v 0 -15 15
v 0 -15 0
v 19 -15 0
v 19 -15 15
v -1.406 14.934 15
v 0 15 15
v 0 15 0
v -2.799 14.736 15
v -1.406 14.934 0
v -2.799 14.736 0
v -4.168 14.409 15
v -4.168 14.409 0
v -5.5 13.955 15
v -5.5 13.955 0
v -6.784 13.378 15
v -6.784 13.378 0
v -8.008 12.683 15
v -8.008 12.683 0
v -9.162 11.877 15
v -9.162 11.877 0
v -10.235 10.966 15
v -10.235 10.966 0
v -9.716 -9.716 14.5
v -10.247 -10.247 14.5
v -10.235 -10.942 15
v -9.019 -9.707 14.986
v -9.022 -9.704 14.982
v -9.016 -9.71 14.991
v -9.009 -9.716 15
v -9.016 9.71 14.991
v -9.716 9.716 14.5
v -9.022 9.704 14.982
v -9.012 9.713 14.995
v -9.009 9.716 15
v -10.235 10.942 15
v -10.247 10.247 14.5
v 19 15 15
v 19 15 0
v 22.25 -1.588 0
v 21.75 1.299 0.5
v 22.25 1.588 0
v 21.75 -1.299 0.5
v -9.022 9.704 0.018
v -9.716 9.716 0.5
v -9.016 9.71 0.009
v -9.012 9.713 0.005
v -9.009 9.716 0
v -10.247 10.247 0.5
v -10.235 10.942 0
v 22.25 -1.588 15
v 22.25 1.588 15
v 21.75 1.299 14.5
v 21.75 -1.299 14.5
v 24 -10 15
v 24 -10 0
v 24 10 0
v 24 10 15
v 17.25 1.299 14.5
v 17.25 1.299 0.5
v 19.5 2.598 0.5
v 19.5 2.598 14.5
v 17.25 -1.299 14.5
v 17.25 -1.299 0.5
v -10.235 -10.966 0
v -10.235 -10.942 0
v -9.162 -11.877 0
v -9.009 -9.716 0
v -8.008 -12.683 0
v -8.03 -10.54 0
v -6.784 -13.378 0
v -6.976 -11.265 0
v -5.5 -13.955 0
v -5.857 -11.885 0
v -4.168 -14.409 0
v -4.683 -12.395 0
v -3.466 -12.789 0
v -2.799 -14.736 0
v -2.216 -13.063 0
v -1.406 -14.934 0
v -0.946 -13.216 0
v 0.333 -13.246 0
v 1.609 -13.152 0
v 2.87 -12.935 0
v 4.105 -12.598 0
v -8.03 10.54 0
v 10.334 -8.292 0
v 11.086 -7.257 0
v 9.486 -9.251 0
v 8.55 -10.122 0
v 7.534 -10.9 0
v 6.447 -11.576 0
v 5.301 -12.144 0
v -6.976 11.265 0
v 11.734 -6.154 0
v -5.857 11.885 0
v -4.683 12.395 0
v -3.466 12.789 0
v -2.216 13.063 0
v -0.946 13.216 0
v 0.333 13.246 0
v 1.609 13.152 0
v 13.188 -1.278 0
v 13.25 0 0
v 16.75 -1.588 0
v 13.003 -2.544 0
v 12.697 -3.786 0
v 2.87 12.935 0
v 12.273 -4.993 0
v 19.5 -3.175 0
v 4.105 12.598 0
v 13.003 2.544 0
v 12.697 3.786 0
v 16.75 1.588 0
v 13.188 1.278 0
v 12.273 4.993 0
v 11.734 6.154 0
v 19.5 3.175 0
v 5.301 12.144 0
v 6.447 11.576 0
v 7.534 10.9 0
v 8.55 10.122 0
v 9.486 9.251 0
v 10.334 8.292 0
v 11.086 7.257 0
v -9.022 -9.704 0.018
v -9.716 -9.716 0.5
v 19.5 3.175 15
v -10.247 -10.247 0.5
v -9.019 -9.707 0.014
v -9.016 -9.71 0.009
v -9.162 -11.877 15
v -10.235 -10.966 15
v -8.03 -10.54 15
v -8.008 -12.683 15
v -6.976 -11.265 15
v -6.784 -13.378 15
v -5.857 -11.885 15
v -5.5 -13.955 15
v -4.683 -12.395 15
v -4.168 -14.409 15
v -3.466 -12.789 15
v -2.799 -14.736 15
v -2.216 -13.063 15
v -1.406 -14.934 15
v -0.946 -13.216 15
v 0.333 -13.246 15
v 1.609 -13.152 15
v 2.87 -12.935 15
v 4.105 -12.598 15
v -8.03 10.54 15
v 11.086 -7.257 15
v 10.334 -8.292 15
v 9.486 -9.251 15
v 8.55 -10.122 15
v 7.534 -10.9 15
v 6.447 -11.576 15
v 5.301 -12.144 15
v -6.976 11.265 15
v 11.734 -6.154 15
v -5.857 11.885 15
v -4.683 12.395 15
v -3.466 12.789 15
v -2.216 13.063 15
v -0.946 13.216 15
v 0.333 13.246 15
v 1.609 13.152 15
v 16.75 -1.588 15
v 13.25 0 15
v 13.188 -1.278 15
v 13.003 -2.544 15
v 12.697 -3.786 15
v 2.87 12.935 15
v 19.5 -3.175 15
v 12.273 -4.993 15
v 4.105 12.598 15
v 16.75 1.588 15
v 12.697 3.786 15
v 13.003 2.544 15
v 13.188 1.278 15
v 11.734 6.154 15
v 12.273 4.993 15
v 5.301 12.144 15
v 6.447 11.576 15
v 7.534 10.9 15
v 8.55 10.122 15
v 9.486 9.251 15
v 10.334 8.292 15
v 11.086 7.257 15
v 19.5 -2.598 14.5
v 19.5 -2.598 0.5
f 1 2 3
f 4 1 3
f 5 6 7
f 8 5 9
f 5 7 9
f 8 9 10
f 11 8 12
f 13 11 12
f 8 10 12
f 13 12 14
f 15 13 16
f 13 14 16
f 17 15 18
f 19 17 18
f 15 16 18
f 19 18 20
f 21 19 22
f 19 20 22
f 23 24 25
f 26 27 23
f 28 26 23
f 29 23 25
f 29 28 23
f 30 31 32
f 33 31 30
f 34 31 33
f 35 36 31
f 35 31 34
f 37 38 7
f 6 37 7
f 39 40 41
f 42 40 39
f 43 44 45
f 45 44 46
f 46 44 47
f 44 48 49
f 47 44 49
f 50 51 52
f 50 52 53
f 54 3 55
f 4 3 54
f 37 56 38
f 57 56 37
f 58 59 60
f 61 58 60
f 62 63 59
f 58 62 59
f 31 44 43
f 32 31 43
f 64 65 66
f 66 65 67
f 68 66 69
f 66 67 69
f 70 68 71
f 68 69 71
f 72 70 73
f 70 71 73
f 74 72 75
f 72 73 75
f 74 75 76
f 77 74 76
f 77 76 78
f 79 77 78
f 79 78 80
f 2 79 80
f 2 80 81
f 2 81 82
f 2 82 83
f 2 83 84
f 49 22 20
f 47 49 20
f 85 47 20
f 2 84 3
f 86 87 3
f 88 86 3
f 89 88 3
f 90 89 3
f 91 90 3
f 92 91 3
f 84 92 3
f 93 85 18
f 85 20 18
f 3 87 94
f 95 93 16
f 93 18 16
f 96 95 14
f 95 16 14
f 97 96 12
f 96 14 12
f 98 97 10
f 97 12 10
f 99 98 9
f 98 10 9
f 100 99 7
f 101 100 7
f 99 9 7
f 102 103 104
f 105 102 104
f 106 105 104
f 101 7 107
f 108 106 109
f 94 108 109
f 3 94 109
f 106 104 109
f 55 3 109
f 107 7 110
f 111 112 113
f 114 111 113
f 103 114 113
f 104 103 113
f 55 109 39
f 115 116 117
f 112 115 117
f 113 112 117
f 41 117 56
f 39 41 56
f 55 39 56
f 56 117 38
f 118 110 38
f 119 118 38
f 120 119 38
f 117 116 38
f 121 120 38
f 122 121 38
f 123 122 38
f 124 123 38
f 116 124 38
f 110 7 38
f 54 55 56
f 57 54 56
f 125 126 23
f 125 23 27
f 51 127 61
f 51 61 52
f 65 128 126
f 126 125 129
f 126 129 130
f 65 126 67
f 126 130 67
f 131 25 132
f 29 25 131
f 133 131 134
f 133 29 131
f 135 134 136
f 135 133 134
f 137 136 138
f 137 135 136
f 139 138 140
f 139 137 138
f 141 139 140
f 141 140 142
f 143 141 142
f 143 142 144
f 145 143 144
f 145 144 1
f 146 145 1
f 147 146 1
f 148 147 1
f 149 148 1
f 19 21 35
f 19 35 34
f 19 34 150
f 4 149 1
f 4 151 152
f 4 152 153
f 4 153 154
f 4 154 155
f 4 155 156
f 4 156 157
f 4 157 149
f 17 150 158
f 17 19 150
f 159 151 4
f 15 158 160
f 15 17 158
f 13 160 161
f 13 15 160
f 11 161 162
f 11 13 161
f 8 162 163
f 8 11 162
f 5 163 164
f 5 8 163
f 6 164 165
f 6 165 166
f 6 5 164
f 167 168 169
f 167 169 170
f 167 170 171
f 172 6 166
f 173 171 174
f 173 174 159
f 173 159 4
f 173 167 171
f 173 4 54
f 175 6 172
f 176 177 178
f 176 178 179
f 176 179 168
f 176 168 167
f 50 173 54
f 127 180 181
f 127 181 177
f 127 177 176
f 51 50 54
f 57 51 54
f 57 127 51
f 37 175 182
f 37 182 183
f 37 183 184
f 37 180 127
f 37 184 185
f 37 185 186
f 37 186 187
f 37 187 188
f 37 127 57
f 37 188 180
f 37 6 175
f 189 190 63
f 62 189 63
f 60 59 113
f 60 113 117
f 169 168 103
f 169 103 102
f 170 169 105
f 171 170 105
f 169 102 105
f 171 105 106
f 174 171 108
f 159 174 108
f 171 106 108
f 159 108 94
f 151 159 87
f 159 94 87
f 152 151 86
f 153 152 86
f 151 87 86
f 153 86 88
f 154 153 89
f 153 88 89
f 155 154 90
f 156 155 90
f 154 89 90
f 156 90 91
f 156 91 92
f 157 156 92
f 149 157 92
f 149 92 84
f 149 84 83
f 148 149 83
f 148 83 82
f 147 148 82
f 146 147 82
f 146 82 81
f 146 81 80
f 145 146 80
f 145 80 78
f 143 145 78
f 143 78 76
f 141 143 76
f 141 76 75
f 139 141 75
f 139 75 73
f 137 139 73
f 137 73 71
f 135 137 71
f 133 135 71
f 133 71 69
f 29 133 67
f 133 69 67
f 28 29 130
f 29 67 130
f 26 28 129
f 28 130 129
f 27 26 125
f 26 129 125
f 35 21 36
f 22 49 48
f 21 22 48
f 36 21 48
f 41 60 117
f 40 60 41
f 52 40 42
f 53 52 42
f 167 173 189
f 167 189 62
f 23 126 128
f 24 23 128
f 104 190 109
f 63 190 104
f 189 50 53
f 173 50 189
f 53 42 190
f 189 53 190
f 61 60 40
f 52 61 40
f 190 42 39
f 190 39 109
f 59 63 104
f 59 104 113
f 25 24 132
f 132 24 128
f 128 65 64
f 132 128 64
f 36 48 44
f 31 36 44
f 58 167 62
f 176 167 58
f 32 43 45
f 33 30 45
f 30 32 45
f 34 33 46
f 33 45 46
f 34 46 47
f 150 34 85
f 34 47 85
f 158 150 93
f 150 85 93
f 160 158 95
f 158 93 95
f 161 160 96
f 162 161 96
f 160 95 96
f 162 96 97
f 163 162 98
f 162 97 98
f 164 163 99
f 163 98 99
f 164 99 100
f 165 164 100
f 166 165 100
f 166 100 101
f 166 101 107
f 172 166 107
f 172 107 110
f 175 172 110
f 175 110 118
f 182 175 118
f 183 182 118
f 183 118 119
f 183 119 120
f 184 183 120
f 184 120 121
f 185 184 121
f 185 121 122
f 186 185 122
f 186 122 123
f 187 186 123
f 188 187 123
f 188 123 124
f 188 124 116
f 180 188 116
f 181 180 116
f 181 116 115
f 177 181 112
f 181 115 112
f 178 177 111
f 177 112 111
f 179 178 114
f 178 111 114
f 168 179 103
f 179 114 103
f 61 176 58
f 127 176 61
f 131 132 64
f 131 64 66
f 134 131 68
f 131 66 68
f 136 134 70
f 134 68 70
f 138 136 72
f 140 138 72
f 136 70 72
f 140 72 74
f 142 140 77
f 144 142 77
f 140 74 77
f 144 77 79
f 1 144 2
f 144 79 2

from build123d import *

# Parameters (mm, degrees)
F1_DEPTH    = 15
F2_T1_DEPTH = 17.6582428067
F2_T3_DEPTH = 17.5274686085
F2_T5_DEPTH = 4.321682988
F2_T7_DEPTH = 4.321682988
F3_SIZE     = 5
F4_SIZE     = 0.5


# Not quite as in the source:
# - a fillet or chamfer that OpenCascade refuses, or shapes differently, is made with other operations: its cross-section is extruded or revolved along the edge and cut away or added


with BuildPart() as f1:
    # F0 (on Top) → F1 (new body)
    with BuildSketch(Plane.XY):
        with BuildLine():
            ThreePointArc((0, -15), (10.6066017178, -10.6066017178), (15, 0))
            ThreePointArc((15, 0), (10.6066017178, 10.6066017178), (0, 15))
            ThreePointArc((0, 15), (-5.7402514855, 13.8581929877), (-10.6066017178, 10.6066017178))
            Line((-10.6066017178, 10.6066017178), (-9.3691648507, 9.3691648507))
            ThreePointArc((-9.3691648507, 9.3691648507), (5.0705554788, 12.2414038058), (13.25, 0))
            ThreePointArc((13.25, 0), (5.0705554788, -12.2414038058), (-9.3691648507, -9.3691648507))
            Line((-9.3691648507, -9.3691648507), (-10.6066017178, -10.6066017178))
            ThreePointArc((-10.6066017178, -10.6066017178), (-5.7402514855, -13.8581929877), (0, -15))
        make_face()
        with BuildLine():
            ThreePointArc((0, 15), (10.6066017178, 10.6066017178), (15, 0))
            ThreePointArc((15, 0), (10.6066017178, -10.6066017178), (0, -15))
            Line((0, -15), (24, -15))
            Line((24, -15), (24, 15))
            Line((24, 15), (0, 15))
        make_face()
        Polygon((19.5, -2.5980762114), (17.25, -1.2990381057), (17.25, 1.2990381057), (19.5, 2.5980762114), (21.75, 1.2990381057), (21.75, -1.2990381057), align=None, mode=Mode.SUBTRACT)
    extrude(amount=F1_DEPTH)

    # F2: chamfer of 0.5 on 8 edges, made by hand

    # F2_s2 → F2_t1 (cut)
    with BuildSketch(Plane.XY.offset(-1.3291214034)):
        with BuildLine():
            Line((-10.234549009, 10.9660387826), (-10.246950766, 10.246950766))
            Line((-10.246950766, 10.246950766), (-10.6066017178, 10.6066017178))
            ThreePointArc((-10.6066017178, 10.6066017178), (-10.4170400144, 10.7928345368), (-10.234549009, 10.9660387826))
        make_face()
        with BuildLine():
            Line((-10.246950766, -10.246950766), (-10.234549009, -10.9660387826))
            ThreePointArc((-10.234549009, -10.9660387826), (-10.4170400144, -10.7928345368), (-10.6066017178, -10.6066017178))
            Line((-10.6066017178, -10.6066017178), (-10.246950766, -10.246950766))
        make_face()
    extrude(amount=F2_T1_DEPTH, mode=Mode.SUBTRACT)

    # F2_s4 → F2_t3 (cut)
    with BuildSketch(Plane.XY.offset(-1.2637343043)):
        with BuildLine():
            Line((-9.7162878714, 9.7162878714), (-9.0222714088, 9.7036652161))
            ThreePointArc((-9.0222714088, 9.7036652161), (-9.1921439944, 9.5429025346), (-9.3691648507, 9.3691648507))
            Line((-9.3691648507, 9.3691648507), (-9.7162878714, 9.7162878714))
        make_face()
        with BuildLine():
            Line((-9.7162878714, -9.7162878714), (-9.0222714088, -9.7036652161))
            ThreePointArc((-9.0222714088, -9.7036652161), (-9.1921439944, -9.5429025346), (-9.3691648507, -9.3691648507))
            Line((-9.3691648507, -9.3691648507), (-9.7162878714, -9.7162878714))
        make_face()
    extrude(amount=F2_T3_DEPTH, mode=Mode.SUBTRACT)

    # F2_s6 → F2_t5 (cut)
    with BuildSketch(Plane(origin=(-11.5158289577, 11.5158289577, 0), x_dir=(0, 0, 1), z_dir=(0.7071067812, -0.7071067812, 0))):
        Polygon((0.5, 0), (0, -0.5), (0, 0), align=None)
        Polygon((14.5, 0), (15, -0.5), (15, 0), align=None)
    extrude(amount=F2_T5_DEPTH, mode=Mode.SUBTRACT)

    # F2_s8 → F2_t7 (cut)
    with BuildSketch(Plane(origin=(-8.4599376108, -8.4599376108, 0), x_dir=(0, 0, 1), z_dir=(-0.7071067812, -0.7071067812, 0))):
        Polygon((0.5, 0), (0, -0.5), (0, 0), align=None)
        Polygon((14.5, 0), (15, -0.5), (15, 0), align=None)
    extrude(amount=F2_T7_DEPTH, mode=Mode.SUBTRACT)

    # F3
    f3_edges = [f1.edges().sort_by_distance(p)[0] for p in [
        (24, -15, 7.5),
        (24, 15, 7.5),
    ]]
    chamfer(f3_edges, length=F3_SIZE)

    # F4
    f4_edges = [f1.edges().sort_by_distance(p)[0] for p in [
        (18.375, 1.948557, 15),
        (20.625, 1.948557, 15),
        (21.75, 0, 15),
        (20.625, -1.948557, 15),
        (18.375, -1.948557, 15),
        (17.25, 0, 15),
        (20.625, 1.948557, 0),
        (21.75, 0, 0),
        (20.625, -1.948557, 0),
        (18.375, -1.948557, 0),
        (17.25, 0, 0),
        (18.375, 1.948557, 0),
    ]]
    chamfer(f4_edges, length=F4_SIZE)


solid = f1.part
